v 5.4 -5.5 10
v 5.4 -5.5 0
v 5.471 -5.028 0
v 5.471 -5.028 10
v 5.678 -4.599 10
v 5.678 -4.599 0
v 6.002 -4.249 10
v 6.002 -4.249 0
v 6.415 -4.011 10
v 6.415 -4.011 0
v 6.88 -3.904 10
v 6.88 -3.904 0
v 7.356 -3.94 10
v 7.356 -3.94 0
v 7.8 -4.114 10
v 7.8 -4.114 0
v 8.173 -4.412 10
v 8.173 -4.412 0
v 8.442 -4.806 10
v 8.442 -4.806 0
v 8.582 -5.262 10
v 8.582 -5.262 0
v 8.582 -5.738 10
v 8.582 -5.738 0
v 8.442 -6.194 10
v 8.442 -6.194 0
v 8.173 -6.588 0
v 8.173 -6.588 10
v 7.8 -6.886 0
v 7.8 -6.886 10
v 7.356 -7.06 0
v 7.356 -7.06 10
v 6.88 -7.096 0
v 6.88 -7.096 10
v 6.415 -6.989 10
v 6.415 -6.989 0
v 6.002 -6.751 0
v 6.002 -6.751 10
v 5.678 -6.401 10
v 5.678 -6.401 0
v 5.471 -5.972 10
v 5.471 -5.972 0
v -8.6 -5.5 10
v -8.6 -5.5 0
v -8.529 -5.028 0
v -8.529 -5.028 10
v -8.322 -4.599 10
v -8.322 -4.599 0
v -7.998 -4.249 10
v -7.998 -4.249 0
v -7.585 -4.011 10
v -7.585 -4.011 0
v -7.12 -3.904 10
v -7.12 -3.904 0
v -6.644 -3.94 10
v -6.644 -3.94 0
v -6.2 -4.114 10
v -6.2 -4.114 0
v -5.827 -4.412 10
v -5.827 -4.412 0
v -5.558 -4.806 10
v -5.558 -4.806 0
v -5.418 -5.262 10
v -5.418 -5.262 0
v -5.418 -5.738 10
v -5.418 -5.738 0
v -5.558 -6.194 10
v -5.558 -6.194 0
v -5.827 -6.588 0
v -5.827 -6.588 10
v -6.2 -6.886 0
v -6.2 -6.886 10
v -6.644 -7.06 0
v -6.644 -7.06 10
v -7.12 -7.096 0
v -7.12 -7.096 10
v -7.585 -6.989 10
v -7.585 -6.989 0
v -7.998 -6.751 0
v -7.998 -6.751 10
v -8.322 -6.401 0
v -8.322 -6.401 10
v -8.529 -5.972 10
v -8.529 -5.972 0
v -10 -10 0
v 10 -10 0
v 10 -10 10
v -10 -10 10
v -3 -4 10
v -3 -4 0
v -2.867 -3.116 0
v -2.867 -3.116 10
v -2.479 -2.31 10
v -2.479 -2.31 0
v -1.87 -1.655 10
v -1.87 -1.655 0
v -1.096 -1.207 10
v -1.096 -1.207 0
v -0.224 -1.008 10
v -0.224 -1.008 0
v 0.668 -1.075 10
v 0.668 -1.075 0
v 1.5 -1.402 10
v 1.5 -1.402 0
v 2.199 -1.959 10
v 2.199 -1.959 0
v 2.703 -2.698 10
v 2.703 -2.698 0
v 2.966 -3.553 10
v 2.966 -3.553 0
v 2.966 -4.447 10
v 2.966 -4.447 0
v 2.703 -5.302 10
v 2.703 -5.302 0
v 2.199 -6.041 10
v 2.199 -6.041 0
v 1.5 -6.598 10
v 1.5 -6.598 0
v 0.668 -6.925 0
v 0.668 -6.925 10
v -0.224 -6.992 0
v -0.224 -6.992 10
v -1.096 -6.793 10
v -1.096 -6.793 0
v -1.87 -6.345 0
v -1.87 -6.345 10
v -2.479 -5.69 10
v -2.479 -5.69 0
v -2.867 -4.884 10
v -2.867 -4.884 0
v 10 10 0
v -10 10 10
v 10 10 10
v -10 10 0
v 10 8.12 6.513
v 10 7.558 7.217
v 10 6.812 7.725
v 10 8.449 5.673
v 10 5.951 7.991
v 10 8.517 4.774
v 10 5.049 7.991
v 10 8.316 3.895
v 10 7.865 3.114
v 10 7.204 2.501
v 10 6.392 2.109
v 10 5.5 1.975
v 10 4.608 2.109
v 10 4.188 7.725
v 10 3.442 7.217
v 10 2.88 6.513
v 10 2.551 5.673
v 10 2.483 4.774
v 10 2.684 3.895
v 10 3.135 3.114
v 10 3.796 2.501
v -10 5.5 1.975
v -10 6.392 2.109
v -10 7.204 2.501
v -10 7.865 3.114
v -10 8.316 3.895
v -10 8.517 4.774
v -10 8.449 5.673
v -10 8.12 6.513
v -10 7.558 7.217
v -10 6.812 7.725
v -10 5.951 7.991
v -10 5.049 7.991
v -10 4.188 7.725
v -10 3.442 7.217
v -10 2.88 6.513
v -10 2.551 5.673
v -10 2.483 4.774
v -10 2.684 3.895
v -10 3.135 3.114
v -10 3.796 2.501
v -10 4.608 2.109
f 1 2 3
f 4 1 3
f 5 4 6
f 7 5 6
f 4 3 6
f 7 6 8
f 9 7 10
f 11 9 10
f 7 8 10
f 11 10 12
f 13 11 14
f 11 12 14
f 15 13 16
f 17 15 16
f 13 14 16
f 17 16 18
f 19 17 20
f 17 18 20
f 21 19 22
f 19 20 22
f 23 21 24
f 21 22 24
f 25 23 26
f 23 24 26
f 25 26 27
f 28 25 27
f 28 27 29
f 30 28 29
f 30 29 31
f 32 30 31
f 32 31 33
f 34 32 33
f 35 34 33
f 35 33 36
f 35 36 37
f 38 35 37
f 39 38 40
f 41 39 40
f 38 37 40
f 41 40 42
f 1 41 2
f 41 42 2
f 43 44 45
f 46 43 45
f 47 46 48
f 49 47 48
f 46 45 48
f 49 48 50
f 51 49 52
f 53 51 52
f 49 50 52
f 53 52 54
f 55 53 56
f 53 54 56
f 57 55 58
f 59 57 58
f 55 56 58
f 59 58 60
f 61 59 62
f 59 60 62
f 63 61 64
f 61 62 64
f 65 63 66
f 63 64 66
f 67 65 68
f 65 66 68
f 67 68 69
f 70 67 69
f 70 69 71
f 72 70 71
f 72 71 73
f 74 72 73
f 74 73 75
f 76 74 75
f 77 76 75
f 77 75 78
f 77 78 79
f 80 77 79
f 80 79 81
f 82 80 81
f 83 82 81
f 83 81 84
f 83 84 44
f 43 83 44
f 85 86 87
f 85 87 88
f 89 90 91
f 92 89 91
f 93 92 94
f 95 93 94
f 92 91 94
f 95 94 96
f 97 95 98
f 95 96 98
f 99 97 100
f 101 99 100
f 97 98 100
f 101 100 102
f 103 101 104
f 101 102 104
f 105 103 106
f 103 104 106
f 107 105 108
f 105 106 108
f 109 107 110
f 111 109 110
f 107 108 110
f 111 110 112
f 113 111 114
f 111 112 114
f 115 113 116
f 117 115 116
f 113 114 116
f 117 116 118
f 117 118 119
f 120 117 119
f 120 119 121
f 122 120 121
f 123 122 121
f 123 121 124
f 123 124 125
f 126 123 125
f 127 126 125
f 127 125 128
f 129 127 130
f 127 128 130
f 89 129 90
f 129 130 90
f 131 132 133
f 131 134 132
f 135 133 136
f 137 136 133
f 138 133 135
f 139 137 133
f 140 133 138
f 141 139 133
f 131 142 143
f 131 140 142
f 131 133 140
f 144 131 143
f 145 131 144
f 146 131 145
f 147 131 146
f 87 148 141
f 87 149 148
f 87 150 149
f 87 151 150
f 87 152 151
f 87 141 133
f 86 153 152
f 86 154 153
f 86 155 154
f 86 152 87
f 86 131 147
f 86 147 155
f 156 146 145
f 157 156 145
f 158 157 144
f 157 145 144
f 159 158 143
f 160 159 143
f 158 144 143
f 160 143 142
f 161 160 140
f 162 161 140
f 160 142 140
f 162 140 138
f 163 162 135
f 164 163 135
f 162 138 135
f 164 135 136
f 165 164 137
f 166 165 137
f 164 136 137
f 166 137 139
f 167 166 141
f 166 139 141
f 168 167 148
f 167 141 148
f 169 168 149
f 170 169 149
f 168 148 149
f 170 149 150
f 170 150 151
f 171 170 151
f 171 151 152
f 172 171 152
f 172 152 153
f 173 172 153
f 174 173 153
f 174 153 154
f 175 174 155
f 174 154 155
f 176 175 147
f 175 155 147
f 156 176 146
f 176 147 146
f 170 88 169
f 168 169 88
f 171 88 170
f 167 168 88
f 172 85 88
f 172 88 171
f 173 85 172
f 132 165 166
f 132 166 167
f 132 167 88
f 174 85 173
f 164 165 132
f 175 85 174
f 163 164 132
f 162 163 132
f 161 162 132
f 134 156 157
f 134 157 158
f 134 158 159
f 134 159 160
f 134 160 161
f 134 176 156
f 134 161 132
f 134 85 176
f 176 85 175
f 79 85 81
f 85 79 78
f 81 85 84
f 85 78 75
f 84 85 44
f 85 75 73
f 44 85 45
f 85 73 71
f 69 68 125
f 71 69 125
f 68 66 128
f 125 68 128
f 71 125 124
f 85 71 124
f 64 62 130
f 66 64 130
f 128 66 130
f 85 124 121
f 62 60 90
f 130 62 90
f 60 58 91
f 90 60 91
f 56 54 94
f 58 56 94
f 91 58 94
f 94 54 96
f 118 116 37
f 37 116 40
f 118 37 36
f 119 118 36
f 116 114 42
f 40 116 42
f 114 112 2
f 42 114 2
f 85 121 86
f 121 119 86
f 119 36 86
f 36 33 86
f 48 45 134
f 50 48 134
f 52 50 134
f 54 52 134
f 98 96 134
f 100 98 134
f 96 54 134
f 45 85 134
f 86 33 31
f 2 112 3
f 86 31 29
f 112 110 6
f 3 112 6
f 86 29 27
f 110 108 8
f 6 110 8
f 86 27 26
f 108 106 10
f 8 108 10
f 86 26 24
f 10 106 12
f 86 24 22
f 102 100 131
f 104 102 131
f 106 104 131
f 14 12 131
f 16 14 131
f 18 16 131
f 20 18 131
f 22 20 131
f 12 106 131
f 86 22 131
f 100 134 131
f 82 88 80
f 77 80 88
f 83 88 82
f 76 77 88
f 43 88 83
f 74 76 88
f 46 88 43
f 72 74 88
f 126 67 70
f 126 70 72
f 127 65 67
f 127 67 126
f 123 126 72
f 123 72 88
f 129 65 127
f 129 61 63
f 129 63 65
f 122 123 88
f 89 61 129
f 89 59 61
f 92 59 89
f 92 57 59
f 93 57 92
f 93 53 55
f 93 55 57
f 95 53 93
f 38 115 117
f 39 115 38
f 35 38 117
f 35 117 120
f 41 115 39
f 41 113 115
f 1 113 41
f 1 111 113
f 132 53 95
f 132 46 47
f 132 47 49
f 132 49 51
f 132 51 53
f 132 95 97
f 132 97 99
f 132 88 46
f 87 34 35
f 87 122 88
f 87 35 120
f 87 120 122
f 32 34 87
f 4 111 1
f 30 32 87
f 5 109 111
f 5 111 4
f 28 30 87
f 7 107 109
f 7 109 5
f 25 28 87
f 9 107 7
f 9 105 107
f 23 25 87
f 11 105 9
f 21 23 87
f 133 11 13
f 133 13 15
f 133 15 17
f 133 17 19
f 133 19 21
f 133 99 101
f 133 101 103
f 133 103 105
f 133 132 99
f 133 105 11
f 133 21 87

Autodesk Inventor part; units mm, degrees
ref_plane "YZ Plane" through (0, 0, 0) normal (1, 0, 0) x (0, 1, 0)
ref_plane "XZ Plane" through (0, 0, 0) normal (0, 1, 0) x (-1, 0, 0)
ref_plane "XY Plane" through (0, 0, 0) normal (0, 0, 1) x (1, 0, 0)
sketch "Sketch1" plane through (0, 0, 0) normal (0, 0, 1) x (1, 0, 0)
  line L0 (-10, 10) -> (10, 10)
  line L1 (10, 10) -> (10, -10)
  line L2 (10, -10) -> (-10, -10)
  line L3 (-10, -10) -> (-10, 10)
  point P0 (0, 0)
  dimension "d0" = 20
  dimension "d1" = 10
  dimension "d2" = 10
  dimension "d3" = 10
extrude "Extrusion1" add sketch "Sketch1" along normal blind 10
sketch "Sketch2" plane through (0, 0, 0) normal (0, 0, -1) x (-1, 0, 0)
  circle A0 centre (0, -4) radius 3
  line L0 (0, -4) -> (0, 0) construction
  circle A1 centre (-7, -5.5) radius 1.6
  circle A2 centre (7, -5.5) radius 1.6
  dimension "d6" = 6
  dimension "d7" = 4
  dimension "d8" = 3.2
  dimension "d9" = 7
  dimension "d10" = 5.5
sketch "Sketch3" plane through (10, -10, 0) normal (1, 0, 0) x (0, 0, -1)
  circle A0 centre (-5, 15.5) radius 3.025
  point P0 (0, 10)
  point P1 (0, 0)
  dimension "d11" = 6.05
  dimension "d12" = 5
  dimension "d13" = 15.5
extrude "Extrusion2" cut sketch "Sketch3" against normal blind 20
extrude "Extrusion3" cut sketch "Sketch2" against normal blind 10
properties part number "ENDER 3 HEATBLOCK" material "Aluminum 6061, Welded"
